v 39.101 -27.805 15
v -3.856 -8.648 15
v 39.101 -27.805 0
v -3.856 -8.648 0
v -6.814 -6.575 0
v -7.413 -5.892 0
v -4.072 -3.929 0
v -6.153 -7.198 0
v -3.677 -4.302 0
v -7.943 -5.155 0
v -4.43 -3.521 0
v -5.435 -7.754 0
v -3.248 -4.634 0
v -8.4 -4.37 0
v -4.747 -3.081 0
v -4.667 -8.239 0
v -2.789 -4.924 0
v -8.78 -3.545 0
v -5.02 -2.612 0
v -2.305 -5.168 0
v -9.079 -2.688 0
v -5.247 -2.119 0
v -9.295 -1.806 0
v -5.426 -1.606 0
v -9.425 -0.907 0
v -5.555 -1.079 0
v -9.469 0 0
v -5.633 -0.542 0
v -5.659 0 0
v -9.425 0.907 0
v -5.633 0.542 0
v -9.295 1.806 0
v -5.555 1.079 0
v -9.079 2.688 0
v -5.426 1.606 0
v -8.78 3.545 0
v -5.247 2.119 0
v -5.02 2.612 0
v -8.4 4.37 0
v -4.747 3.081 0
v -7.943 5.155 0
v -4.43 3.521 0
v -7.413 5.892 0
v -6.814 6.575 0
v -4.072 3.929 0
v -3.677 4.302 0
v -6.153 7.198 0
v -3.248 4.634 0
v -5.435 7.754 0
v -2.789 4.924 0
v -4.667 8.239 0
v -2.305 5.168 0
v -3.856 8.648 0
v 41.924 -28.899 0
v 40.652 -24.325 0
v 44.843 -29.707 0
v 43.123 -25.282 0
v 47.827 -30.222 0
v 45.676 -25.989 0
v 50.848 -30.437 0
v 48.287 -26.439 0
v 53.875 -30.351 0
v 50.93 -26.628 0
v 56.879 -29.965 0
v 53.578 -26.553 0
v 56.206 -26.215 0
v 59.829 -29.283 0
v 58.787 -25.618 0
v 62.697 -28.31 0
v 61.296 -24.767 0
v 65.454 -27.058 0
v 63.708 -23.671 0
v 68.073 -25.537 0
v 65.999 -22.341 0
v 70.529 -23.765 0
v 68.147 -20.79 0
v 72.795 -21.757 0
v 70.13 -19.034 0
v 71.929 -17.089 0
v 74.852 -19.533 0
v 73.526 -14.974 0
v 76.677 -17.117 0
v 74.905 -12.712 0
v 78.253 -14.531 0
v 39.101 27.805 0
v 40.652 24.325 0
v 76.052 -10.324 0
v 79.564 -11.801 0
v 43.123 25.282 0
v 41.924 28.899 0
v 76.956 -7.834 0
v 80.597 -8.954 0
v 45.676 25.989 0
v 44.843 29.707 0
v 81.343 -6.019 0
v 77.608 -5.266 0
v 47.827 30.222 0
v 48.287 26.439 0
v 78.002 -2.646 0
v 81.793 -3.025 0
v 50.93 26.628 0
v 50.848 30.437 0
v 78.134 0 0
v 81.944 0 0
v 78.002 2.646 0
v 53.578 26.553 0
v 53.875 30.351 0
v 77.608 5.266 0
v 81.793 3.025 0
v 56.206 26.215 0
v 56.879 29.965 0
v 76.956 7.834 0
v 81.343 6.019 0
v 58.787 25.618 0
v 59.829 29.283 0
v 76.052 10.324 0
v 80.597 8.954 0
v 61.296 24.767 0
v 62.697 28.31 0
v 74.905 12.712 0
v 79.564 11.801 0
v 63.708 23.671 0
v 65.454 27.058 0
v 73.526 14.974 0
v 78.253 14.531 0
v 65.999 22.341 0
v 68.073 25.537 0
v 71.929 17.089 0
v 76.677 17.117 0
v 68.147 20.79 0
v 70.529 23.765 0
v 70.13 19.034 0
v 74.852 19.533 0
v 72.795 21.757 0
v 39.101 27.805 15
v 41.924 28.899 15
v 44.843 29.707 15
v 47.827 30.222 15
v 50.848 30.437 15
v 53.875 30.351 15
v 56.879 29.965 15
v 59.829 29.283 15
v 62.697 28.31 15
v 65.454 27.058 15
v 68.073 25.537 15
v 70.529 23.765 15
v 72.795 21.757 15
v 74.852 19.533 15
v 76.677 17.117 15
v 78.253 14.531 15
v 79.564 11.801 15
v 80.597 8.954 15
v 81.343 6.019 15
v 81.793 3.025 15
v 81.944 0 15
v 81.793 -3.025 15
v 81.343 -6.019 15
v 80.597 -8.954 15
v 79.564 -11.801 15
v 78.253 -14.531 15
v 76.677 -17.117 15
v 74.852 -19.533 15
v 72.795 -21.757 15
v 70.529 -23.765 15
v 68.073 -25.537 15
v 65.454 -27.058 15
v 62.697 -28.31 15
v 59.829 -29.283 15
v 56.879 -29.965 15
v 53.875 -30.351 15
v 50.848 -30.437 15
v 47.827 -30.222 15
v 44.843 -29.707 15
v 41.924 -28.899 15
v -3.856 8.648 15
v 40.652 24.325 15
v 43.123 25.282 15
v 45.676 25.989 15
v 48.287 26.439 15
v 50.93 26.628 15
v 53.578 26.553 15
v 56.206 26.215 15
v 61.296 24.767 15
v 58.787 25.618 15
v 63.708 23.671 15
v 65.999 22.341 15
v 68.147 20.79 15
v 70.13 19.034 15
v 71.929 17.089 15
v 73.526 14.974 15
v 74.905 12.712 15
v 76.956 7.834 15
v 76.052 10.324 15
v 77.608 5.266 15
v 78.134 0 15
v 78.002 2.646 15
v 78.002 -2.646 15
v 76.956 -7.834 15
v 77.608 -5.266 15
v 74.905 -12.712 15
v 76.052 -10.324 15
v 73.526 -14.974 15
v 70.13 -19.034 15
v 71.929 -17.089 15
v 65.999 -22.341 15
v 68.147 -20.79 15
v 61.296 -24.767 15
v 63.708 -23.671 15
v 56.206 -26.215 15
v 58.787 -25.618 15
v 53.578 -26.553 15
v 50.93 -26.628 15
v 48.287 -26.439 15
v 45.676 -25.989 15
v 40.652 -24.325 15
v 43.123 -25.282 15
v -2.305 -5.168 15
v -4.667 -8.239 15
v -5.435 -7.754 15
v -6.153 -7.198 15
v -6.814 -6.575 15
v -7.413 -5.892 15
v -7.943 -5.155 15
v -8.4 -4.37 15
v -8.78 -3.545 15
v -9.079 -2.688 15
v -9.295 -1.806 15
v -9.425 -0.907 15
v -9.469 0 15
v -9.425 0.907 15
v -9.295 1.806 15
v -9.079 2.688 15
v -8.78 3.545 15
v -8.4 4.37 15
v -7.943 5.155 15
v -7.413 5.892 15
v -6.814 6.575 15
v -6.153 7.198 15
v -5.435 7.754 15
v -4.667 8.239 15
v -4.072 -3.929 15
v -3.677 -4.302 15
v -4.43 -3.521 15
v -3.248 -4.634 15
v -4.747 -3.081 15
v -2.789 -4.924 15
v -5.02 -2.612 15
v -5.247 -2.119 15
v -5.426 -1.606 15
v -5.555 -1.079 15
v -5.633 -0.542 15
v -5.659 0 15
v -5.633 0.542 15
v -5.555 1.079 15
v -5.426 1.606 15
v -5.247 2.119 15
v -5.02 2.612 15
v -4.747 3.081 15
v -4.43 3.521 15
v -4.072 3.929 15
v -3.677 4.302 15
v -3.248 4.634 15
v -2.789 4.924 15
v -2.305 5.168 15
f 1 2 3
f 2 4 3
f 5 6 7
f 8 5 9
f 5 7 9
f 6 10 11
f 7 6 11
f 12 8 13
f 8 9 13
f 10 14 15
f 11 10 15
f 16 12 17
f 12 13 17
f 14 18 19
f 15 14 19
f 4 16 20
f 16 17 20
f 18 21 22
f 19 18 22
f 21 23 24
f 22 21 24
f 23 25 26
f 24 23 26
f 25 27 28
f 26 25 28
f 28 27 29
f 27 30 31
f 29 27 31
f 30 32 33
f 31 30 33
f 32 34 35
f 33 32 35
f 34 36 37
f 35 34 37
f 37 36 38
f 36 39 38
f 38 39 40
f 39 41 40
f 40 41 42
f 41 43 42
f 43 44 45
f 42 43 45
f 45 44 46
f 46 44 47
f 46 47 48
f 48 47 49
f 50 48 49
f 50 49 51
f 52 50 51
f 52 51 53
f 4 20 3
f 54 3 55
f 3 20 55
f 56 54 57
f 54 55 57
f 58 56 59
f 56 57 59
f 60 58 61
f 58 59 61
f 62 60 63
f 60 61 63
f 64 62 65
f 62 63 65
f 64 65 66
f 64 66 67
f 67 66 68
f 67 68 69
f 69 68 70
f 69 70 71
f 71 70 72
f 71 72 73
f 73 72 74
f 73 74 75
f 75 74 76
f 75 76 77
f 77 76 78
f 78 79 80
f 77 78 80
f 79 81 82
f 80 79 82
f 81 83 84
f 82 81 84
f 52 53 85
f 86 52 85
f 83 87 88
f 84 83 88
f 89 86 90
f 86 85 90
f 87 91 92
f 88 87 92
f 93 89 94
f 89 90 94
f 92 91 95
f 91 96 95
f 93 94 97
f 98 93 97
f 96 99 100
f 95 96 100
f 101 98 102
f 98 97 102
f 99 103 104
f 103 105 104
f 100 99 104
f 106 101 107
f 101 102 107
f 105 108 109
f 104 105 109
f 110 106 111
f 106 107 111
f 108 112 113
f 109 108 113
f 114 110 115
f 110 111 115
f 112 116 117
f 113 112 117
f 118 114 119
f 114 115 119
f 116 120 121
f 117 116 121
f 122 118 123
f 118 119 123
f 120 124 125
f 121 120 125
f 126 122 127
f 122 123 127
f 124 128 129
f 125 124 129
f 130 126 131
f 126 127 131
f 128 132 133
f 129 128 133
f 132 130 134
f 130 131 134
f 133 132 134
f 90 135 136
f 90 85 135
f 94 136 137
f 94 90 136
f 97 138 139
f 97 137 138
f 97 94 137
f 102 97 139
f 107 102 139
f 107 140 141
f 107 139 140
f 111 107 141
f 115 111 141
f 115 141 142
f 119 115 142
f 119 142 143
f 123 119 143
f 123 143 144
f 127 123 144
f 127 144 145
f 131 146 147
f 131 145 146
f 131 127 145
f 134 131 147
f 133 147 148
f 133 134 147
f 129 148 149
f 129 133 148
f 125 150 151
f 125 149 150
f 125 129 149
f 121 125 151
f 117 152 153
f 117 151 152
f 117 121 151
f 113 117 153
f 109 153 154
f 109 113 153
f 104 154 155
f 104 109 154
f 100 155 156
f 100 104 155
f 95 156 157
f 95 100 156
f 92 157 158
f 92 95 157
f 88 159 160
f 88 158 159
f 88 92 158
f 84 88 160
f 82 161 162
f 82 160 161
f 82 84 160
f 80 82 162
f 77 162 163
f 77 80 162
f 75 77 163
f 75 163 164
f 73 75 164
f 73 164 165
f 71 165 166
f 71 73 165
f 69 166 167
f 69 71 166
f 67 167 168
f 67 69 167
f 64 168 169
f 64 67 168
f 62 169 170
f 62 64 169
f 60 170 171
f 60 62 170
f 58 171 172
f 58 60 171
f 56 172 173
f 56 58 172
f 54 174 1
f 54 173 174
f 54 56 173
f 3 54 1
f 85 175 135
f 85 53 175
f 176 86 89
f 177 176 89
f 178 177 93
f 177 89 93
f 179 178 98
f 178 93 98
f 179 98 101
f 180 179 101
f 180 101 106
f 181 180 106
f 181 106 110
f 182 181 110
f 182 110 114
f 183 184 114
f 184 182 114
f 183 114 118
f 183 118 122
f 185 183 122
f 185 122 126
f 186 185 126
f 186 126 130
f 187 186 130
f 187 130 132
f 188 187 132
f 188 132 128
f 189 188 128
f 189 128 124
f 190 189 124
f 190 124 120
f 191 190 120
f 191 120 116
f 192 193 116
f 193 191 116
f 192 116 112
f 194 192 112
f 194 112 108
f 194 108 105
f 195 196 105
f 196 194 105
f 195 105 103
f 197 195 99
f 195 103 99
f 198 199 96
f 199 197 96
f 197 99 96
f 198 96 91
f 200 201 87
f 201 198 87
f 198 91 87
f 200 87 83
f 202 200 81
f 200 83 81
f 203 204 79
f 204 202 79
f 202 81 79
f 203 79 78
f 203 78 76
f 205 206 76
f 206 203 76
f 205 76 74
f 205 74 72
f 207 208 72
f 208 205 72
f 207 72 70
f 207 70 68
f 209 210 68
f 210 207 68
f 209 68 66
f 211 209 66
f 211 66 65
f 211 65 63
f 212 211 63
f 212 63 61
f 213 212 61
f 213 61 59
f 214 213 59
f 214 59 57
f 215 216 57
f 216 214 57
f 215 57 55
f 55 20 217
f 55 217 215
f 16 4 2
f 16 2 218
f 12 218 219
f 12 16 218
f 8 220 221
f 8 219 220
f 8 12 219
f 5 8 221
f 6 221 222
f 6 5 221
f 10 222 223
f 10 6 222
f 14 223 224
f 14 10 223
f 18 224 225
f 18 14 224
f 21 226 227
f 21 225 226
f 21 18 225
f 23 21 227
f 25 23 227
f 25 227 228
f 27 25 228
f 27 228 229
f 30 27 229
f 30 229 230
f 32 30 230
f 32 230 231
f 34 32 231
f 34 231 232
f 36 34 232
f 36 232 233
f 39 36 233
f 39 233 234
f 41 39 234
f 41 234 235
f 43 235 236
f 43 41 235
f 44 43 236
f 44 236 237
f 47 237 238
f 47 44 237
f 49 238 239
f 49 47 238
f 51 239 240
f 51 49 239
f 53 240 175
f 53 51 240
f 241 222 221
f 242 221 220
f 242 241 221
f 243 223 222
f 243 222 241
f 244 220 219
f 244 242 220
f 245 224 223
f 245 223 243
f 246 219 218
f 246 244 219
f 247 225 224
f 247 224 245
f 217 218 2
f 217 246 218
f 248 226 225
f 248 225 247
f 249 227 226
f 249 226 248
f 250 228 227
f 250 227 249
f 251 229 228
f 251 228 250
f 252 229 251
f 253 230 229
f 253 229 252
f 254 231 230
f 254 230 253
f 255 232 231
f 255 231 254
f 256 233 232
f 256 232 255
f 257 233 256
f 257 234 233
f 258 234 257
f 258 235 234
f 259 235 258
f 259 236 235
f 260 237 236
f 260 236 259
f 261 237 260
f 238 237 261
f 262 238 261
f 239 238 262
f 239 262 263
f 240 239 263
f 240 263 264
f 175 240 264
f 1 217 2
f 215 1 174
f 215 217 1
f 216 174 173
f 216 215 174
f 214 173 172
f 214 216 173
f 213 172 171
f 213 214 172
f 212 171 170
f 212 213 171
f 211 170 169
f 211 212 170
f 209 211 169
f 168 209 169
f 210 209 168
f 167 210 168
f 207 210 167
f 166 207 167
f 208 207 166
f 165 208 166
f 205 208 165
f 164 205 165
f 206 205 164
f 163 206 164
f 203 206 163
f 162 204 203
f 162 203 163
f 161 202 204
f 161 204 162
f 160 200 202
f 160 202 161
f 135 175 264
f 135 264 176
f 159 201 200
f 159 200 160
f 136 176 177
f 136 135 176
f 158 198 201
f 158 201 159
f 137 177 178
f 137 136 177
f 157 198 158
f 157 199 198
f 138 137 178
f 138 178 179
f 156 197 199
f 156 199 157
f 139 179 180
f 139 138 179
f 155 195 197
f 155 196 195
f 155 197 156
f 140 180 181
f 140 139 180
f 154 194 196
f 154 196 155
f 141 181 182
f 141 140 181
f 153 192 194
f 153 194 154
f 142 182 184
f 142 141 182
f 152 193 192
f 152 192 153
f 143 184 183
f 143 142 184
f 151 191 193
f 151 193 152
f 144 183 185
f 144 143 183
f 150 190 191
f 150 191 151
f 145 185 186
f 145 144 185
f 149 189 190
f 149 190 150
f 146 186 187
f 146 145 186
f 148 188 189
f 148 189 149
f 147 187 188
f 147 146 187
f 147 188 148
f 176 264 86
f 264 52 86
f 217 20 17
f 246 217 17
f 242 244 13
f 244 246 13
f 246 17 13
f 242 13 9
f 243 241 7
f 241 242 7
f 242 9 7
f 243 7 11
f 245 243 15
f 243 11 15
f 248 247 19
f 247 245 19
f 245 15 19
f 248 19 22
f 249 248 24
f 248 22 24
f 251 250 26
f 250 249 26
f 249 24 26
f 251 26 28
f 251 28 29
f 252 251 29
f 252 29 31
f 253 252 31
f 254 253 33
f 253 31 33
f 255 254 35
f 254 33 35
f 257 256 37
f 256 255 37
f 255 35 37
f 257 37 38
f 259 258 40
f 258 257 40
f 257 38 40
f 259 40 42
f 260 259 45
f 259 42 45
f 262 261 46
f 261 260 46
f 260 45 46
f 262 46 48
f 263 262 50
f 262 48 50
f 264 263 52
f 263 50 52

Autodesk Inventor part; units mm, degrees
ref_plane "YZ Plane" through (0, 0, 0) normal (1, 0, 0) x (0, 1, 0)
ref_plane "XZ Plane" through (0, 0, 0) normal (0, 1, 0) x (-1, 0, 0)
ref_plane "XY Plane" through (0, 0, 0) normal (0, 0, 1) x (1, 0, 0)
sketch "Sketch1" plane through (0, 0, 0) normal (0, 0, 1) x (1, 0, 0)
  circle A0 centre (0, 0) radius 7.26 construction
  line L0 (0, 0) -> (51.5, 0) construction
  arc A1 (-2.3048, 5.1684) -> (-2.3048, -5.1684) centre (0, 0) ccw
  arc A2 (9.469, 0) -> (4.6289, 8.2604) centre (0, 0) ccw construction
  circle A3 centre (51.5, 0) radius 28.265 construction
  arc A4 (40.6525, -24.3249) -> (40.6525, 24.3249) centre (51.5, 0) ccw
  arc A5 (21.056, 0) -> (27.1842, -18.3188) centre (51.5, 0) ccw construction
  line L1 (-3.8565, 8.6481) -> (39.1007, 27.8046)
  line L2 (-3.8565, -8.6481) -> (39.1007, -27.8046)
  line L3 (-2.3048, 5.1684) -> (40.6525, 24.3249)
  line L4 (-2.3048, -5.1684) -> (40.6525, -24.3249)
  arc A6 (24.866, 0) -> (40.6525, -24.3249) centre (51.5, 0) ccw construction
  arc A7 (40.6525, 24.3249) -> (24.866, 0) centre (51.5, 0) ccw construction
  arc A8 (5.659, 0) -> (-2.3048, 5.1684) centre (0, 0) ccw construction
  arc A9 (-2.3048, -5.1684) -> (5.659, 0) centre (0, 0) ccw construction
  arc A10 (4.6289, -8.2604) -> (9.469, 0) centre (0, 0) ccw construction
  arc A11 (4.6289, 8.2604) -> (-3.8565, 8.6481) centre (0, 0) ccw construction
  arc A12 (27.1842, 18.3188) -> (21.056, 0) centre (51.5, 0) ccw construction
  arc A13 (27.1842, -18.3188) -> (39.1007, -27.8046) centre (51.5, 0) ccw construction
  arc A14 (-3.8565, 8.6481) -> (-3.8565, -8.6481) centre (0, 0) ccw
  arc A15 (-3.8565, -8.6481) -> (4.6289, -8.2604) centre (0, 0) ccw construction
  arc A16 (39.1007, 27.8046) -> (27.1842, 18.3188) centre (51.5, 0) ccw construction
  arc A17 (39.1007, -27.8046) -> (39.1007, 27.8046) centre (51.5, 0) ccw
  dimension "d0" = 14.52
  dimension "d1" = 51.5
  dimension "d4" = 56.53
  dimension "d10" = 3.81
  dimension "d12" = 3.81
  dimension "d13" = 1.601
  dimension "d14" = 1.631
extrude "Extrusion1" add sketch "Sketch1" along normal blind 15
properties part number "Belt" material "Rubber, Silicone"
